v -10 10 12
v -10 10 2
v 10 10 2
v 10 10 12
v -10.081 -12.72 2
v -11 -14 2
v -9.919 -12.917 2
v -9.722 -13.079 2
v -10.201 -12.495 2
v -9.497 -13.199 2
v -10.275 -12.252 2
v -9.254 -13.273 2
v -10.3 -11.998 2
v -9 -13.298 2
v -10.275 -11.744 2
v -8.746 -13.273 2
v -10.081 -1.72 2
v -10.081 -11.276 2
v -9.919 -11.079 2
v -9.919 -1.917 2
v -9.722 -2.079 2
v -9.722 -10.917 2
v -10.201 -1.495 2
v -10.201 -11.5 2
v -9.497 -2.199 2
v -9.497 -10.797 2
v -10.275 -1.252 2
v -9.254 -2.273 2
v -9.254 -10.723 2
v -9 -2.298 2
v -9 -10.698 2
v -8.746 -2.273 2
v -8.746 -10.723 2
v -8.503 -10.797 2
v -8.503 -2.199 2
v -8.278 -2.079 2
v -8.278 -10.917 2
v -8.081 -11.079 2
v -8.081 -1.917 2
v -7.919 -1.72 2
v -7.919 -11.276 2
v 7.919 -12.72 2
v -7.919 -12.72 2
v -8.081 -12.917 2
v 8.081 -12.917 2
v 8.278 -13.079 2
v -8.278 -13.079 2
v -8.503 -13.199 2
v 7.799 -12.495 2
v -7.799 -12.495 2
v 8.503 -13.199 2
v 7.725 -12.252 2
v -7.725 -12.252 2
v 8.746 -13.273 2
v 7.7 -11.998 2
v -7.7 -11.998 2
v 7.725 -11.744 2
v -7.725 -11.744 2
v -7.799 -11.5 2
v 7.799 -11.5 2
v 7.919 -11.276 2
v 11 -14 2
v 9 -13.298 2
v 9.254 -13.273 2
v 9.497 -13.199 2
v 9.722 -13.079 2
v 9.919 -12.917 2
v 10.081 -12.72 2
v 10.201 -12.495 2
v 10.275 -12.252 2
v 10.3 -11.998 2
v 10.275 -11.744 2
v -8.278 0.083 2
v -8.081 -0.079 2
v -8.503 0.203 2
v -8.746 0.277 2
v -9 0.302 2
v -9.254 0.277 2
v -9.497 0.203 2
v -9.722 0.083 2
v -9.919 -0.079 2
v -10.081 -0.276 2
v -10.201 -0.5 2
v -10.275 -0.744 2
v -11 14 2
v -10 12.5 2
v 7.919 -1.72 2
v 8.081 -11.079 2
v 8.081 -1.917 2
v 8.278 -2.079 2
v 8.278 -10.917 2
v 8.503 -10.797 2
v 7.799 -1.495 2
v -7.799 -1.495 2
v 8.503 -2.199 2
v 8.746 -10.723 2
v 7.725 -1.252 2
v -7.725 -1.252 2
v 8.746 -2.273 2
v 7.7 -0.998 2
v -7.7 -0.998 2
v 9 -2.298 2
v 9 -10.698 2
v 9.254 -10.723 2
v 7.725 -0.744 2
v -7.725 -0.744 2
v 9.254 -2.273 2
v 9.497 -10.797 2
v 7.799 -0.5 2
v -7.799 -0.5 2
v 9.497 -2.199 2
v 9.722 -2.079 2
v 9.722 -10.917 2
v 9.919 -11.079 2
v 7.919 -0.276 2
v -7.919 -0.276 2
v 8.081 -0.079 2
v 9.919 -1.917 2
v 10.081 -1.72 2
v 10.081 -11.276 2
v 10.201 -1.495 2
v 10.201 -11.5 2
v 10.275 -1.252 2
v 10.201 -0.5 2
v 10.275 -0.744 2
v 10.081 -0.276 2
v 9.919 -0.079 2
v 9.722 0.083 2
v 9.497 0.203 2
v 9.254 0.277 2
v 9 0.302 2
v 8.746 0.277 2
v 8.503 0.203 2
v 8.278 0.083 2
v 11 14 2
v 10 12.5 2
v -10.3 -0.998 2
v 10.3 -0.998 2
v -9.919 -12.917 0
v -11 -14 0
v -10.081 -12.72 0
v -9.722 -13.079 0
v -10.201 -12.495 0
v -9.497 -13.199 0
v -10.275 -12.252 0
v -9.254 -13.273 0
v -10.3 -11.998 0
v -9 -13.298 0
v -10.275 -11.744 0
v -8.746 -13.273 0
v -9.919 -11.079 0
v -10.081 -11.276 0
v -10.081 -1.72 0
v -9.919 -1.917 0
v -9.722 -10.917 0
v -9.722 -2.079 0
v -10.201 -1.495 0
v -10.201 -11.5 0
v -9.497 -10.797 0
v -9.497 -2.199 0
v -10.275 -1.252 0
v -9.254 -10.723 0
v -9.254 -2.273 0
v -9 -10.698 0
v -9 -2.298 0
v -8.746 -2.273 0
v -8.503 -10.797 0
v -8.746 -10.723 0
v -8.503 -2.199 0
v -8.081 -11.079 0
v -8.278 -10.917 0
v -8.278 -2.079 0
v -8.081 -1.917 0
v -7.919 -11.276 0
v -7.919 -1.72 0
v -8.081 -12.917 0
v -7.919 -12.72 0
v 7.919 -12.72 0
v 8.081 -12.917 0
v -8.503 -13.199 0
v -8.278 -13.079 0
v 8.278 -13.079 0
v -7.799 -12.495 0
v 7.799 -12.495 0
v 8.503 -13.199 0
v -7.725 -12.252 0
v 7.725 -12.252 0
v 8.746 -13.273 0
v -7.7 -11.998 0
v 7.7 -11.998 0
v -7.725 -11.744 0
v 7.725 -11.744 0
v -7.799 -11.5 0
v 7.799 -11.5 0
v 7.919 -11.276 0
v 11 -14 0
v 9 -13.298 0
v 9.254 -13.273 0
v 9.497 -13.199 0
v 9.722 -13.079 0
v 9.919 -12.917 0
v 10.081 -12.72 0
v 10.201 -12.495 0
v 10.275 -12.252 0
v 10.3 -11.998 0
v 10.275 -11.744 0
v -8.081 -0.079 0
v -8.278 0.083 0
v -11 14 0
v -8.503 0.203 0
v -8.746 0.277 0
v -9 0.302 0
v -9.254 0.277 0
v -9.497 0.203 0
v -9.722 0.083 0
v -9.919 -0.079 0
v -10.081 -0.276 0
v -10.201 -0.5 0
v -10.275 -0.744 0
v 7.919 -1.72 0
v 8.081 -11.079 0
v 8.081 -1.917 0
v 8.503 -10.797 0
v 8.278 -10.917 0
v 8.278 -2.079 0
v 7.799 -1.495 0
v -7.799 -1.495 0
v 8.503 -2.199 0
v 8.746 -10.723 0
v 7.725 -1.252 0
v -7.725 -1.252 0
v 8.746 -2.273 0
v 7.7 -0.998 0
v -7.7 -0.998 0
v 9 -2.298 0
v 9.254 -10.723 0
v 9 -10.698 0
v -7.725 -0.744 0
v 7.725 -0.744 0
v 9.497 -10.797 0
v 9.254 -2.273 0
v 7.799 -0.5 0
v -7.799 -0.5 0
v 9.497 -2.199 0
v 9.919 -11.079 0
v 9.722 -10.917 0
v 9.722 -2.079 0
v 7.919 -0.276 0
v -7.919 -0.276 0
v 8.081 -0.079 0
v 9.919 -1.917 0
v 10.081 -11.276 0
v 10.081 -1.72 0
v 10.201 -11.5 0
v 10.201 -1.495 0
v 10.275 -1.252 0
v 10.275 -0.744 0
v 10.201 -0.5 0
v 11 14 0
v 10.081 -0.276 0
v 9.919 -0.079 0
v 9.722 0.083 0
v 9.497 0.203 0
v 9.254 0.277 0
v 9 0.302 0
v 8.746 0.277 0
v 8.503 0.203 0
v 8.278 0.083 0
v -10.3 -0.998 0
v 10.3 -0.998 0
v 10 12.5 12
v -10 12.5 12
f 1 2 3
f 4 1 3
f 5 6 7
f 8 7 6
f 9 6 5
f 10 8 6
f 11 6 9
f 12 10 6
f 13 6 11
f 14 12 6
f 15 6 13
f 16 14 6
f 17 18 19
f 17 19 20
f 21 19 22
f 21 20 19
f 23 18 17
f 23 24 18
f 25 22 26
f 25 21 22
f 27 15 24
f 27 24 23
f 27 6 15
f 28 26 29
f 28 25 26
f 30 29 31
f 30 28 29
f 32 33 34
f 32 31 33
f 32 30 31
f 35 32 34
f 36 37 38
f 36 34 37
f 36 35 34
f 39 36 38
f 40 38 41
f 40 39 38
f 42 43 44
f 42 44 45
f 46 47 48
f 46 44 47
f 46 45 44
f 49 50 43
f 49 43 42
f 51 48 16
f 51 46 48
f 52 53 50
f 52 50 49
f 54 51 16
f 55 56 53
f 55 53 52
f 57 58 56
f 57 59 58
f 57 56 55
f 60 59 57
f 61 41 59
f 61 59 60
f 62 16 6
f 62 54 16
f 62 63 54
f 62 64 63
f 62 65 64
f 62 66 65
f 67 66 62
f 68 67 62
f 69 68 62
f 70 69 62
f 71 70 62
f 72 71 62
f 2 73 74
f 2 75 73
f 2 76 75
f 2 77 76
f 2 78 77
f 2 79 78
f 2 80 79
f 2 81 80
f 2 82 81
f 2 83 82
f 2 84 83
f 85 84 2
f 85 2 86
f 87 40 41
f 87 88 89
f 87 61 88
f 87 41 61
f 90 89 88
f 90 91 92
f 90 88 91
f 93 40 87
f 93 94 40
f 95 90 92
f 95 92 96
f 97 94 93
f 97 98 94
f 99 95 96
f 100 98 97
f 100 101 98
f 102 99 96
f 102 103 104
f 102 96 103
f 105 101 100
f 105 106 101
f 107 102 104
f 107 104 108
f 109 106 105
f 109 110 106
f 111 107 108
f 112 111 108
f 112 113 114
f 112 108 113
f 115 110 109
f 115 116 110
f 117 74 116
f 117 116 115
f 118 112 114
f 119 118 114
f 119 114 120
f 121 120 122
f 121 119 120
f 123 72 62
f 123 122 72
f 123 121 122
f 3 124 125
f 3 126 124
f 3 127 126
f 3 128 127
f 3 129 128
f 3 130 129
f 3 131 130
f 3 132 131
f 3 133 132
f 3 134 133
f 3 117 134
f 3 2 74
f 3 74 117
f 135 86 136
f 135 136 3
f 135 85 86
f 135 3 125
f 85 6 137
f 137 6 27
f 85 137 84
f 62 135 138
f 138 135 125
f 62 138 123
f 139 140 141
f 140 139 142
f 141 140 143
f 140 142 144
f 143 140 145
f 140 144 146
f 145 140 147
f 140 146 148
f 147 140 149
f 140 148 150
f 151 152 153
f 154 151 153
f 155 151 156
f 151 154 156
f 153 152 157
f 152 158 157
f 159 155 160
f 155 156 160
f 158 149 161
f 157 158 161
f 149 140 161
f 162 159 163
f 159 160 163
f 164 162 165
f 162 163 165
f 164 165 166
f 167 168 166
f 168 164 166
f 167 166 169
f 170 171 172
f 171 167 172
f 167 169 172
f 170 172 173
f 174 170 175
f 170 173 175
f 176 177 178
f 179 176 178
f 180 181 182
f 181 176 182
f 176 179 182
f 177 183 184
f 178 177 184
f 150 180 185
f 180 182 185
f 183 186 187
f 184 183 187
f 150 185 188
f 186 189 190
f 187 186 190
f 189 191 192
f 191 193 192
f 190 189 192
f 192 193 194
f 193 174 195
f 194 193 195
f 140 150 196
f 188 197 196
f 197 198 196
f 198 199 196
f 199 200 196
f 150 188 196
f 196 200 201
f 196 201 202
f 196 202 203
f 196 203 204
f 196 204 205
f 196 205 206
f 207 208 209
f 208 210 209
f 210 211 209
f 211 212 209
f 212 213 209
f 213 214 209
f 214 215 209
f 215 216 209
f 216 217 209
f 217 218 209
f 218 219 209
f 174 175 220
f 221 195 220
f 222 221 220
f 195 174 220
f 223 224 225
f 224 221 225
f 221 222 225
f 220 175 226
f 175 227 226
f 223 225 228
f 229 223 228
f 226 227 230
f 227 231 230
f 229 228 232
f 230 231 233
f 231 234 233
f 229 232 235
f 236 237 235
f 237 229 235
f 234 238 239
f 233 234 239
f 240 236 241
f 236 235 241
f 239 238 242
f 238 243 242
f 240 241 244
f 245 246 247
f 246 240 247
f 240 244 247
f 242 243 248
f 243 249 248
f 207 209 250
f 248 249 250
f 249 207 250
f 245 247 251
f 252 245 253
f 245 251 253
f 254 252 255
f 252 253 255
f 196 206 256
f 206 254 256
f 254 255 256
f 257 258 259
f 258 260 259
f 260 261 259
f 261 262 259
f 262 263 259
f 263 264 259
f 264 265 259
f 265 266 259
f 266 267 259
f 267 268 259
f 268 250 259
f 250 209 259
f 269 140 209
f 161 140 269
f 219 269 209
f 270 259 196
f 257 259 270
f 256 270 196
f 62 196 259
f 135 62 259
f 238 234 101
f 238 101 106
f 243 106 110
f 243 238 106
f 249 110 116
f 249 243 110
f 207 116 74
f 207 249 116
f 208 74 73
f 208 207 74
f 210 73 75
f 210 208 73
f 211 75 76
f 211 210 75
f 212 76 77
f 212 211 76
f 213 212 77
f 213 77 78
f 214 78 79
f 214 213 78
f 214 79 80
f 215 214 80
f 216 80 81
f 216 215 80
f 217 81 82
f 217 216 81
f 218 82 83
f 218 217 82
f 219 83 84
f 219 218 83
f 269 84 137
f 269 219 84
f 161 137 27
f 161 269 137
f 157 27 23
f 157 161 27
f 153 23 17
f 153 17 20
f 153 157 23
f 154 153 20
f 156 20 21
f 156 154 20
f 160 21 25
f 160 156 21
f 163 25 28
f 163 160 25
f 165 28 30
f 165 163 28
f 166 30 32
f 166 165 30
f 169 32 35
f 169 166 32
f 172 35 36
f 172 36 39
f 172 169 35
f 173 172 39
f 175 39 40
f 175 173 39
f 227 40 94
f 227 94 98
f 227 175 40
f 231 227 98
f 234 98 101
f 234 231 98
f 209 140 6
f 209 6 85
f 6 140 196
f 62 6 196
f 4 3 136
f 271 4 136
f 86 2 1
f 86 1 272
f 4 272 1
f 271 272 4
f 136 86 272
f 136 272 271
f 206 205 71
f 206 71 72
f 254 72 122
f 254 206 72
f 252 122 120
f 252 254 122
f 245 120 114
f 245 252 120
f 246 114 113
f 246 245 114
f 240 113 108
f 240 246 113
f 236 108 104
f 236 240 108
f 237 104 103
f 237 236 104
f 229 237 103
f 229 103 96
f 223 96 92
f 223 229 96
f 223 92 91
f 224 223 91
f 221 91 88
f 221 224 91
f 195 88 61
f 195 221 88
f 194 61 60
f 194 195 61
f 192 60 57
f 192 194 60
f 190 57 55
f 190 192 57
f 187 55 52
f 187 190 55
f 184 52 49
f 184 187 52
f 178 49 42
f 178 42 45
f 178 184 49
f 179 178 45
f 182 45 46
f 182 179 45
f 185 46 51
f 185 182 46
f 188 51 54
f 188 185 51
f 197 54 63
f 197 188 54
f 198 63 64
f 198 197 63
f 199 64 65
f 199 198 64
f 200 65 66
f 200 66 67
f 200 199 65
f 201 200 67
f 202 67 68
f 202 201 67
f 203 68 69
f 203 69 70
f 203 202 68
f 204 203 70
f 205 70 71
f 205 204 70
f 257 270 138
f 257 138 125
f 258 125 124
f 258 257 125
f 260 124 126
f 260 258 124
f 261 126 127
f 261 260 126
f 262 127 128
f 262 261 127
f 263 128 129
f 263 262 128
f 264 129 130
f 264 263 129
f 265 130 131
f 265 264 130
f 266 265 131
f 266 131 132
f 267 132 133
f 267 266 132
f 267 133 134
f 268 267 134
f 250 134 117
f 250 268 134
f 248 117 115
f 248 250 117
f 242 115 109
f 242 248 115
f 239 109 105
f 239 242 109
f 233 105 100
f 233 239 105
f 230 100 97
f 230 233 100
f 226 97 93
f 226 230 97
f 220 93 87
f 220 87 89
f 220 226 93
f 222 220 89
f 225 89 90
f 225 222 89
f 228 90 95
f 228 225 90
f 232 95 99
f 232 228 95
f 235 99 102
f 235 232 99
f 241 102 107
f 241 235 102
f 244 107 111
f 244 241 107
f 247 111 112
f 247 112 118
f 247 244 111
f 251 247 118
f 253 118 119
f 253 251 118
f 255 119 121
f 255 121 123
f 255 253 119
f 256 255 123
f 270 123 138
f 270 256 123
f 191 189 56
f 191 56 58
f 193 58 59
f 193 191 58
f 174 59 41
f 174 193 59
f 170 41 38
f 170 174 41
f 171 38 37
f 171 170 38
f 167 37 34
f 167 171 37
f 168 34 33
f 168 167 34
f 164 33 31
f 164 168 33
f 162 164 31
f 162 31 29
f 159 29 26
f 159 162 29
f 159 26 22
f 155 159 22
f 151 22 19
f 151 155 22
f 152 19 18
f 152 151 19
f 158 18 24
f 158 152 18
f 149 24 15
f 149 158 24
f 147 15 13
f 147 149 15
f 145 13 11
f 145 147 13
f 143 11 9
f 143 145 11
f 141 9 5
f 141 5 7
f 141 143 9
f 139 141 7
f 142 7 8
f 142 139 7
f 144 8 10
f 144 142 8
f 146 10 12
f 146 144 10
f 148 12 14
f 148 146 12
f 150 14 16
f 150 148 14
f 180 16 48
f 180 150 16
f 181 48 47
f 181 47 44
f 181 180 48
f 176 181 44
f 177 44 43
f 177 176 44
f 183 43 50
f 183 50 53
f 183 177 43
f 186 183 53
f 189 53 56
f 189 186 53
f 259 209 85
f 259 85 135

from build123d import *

# Parameters (mm, degrees)
SKETCH_1_W      = 22
SKETCH_1_H      = 28
SKETCH_1_R      = 1.3
EXTRUDE_1_DEPTH = 2
SKETCH_2_W      = 20
SKETCH_2_H      = 2.5
EXTRUDE_2_DEPTH = 10


with BuildPart() as part:
    # 草图1 → 凸台-拉伸1 (new body)
    with BuildSketch(Plane.XY):
        Rectangle(SKETCH_1_W, SKETCH_1_H)
        with Locations((-9, -11.997945994)):
            Circle(SKETCH_1_R, mode=Mode.SUBTRACT)
        with Locations((-9, -0.997945994)):
            Circle(SKETCH_1_R, mode=Mode.SUBTRACT)
        with Locations((9, -0.997945994)):
            Circle(SKETCH_1_R, mode=Mode.SUBTRACT)
        with Locations((9, -11.997945994)):
            Circle(SKETCH_1_R, mode=Mode.SUBTRACT)
    extrude(amount=EXTRUDE_1_DEPTH)

    # 草图2 → 凸台-拉伸2 (add)
    with BuildSketch(Plane.XY.offset(2)):
        with Locations((0, 11.25)):
            Rectangle(SKETCH_2_W, SKETCH_2_H)
    extrude(amount=EXTRUDE_2_DEPTH)


solid = part.part
